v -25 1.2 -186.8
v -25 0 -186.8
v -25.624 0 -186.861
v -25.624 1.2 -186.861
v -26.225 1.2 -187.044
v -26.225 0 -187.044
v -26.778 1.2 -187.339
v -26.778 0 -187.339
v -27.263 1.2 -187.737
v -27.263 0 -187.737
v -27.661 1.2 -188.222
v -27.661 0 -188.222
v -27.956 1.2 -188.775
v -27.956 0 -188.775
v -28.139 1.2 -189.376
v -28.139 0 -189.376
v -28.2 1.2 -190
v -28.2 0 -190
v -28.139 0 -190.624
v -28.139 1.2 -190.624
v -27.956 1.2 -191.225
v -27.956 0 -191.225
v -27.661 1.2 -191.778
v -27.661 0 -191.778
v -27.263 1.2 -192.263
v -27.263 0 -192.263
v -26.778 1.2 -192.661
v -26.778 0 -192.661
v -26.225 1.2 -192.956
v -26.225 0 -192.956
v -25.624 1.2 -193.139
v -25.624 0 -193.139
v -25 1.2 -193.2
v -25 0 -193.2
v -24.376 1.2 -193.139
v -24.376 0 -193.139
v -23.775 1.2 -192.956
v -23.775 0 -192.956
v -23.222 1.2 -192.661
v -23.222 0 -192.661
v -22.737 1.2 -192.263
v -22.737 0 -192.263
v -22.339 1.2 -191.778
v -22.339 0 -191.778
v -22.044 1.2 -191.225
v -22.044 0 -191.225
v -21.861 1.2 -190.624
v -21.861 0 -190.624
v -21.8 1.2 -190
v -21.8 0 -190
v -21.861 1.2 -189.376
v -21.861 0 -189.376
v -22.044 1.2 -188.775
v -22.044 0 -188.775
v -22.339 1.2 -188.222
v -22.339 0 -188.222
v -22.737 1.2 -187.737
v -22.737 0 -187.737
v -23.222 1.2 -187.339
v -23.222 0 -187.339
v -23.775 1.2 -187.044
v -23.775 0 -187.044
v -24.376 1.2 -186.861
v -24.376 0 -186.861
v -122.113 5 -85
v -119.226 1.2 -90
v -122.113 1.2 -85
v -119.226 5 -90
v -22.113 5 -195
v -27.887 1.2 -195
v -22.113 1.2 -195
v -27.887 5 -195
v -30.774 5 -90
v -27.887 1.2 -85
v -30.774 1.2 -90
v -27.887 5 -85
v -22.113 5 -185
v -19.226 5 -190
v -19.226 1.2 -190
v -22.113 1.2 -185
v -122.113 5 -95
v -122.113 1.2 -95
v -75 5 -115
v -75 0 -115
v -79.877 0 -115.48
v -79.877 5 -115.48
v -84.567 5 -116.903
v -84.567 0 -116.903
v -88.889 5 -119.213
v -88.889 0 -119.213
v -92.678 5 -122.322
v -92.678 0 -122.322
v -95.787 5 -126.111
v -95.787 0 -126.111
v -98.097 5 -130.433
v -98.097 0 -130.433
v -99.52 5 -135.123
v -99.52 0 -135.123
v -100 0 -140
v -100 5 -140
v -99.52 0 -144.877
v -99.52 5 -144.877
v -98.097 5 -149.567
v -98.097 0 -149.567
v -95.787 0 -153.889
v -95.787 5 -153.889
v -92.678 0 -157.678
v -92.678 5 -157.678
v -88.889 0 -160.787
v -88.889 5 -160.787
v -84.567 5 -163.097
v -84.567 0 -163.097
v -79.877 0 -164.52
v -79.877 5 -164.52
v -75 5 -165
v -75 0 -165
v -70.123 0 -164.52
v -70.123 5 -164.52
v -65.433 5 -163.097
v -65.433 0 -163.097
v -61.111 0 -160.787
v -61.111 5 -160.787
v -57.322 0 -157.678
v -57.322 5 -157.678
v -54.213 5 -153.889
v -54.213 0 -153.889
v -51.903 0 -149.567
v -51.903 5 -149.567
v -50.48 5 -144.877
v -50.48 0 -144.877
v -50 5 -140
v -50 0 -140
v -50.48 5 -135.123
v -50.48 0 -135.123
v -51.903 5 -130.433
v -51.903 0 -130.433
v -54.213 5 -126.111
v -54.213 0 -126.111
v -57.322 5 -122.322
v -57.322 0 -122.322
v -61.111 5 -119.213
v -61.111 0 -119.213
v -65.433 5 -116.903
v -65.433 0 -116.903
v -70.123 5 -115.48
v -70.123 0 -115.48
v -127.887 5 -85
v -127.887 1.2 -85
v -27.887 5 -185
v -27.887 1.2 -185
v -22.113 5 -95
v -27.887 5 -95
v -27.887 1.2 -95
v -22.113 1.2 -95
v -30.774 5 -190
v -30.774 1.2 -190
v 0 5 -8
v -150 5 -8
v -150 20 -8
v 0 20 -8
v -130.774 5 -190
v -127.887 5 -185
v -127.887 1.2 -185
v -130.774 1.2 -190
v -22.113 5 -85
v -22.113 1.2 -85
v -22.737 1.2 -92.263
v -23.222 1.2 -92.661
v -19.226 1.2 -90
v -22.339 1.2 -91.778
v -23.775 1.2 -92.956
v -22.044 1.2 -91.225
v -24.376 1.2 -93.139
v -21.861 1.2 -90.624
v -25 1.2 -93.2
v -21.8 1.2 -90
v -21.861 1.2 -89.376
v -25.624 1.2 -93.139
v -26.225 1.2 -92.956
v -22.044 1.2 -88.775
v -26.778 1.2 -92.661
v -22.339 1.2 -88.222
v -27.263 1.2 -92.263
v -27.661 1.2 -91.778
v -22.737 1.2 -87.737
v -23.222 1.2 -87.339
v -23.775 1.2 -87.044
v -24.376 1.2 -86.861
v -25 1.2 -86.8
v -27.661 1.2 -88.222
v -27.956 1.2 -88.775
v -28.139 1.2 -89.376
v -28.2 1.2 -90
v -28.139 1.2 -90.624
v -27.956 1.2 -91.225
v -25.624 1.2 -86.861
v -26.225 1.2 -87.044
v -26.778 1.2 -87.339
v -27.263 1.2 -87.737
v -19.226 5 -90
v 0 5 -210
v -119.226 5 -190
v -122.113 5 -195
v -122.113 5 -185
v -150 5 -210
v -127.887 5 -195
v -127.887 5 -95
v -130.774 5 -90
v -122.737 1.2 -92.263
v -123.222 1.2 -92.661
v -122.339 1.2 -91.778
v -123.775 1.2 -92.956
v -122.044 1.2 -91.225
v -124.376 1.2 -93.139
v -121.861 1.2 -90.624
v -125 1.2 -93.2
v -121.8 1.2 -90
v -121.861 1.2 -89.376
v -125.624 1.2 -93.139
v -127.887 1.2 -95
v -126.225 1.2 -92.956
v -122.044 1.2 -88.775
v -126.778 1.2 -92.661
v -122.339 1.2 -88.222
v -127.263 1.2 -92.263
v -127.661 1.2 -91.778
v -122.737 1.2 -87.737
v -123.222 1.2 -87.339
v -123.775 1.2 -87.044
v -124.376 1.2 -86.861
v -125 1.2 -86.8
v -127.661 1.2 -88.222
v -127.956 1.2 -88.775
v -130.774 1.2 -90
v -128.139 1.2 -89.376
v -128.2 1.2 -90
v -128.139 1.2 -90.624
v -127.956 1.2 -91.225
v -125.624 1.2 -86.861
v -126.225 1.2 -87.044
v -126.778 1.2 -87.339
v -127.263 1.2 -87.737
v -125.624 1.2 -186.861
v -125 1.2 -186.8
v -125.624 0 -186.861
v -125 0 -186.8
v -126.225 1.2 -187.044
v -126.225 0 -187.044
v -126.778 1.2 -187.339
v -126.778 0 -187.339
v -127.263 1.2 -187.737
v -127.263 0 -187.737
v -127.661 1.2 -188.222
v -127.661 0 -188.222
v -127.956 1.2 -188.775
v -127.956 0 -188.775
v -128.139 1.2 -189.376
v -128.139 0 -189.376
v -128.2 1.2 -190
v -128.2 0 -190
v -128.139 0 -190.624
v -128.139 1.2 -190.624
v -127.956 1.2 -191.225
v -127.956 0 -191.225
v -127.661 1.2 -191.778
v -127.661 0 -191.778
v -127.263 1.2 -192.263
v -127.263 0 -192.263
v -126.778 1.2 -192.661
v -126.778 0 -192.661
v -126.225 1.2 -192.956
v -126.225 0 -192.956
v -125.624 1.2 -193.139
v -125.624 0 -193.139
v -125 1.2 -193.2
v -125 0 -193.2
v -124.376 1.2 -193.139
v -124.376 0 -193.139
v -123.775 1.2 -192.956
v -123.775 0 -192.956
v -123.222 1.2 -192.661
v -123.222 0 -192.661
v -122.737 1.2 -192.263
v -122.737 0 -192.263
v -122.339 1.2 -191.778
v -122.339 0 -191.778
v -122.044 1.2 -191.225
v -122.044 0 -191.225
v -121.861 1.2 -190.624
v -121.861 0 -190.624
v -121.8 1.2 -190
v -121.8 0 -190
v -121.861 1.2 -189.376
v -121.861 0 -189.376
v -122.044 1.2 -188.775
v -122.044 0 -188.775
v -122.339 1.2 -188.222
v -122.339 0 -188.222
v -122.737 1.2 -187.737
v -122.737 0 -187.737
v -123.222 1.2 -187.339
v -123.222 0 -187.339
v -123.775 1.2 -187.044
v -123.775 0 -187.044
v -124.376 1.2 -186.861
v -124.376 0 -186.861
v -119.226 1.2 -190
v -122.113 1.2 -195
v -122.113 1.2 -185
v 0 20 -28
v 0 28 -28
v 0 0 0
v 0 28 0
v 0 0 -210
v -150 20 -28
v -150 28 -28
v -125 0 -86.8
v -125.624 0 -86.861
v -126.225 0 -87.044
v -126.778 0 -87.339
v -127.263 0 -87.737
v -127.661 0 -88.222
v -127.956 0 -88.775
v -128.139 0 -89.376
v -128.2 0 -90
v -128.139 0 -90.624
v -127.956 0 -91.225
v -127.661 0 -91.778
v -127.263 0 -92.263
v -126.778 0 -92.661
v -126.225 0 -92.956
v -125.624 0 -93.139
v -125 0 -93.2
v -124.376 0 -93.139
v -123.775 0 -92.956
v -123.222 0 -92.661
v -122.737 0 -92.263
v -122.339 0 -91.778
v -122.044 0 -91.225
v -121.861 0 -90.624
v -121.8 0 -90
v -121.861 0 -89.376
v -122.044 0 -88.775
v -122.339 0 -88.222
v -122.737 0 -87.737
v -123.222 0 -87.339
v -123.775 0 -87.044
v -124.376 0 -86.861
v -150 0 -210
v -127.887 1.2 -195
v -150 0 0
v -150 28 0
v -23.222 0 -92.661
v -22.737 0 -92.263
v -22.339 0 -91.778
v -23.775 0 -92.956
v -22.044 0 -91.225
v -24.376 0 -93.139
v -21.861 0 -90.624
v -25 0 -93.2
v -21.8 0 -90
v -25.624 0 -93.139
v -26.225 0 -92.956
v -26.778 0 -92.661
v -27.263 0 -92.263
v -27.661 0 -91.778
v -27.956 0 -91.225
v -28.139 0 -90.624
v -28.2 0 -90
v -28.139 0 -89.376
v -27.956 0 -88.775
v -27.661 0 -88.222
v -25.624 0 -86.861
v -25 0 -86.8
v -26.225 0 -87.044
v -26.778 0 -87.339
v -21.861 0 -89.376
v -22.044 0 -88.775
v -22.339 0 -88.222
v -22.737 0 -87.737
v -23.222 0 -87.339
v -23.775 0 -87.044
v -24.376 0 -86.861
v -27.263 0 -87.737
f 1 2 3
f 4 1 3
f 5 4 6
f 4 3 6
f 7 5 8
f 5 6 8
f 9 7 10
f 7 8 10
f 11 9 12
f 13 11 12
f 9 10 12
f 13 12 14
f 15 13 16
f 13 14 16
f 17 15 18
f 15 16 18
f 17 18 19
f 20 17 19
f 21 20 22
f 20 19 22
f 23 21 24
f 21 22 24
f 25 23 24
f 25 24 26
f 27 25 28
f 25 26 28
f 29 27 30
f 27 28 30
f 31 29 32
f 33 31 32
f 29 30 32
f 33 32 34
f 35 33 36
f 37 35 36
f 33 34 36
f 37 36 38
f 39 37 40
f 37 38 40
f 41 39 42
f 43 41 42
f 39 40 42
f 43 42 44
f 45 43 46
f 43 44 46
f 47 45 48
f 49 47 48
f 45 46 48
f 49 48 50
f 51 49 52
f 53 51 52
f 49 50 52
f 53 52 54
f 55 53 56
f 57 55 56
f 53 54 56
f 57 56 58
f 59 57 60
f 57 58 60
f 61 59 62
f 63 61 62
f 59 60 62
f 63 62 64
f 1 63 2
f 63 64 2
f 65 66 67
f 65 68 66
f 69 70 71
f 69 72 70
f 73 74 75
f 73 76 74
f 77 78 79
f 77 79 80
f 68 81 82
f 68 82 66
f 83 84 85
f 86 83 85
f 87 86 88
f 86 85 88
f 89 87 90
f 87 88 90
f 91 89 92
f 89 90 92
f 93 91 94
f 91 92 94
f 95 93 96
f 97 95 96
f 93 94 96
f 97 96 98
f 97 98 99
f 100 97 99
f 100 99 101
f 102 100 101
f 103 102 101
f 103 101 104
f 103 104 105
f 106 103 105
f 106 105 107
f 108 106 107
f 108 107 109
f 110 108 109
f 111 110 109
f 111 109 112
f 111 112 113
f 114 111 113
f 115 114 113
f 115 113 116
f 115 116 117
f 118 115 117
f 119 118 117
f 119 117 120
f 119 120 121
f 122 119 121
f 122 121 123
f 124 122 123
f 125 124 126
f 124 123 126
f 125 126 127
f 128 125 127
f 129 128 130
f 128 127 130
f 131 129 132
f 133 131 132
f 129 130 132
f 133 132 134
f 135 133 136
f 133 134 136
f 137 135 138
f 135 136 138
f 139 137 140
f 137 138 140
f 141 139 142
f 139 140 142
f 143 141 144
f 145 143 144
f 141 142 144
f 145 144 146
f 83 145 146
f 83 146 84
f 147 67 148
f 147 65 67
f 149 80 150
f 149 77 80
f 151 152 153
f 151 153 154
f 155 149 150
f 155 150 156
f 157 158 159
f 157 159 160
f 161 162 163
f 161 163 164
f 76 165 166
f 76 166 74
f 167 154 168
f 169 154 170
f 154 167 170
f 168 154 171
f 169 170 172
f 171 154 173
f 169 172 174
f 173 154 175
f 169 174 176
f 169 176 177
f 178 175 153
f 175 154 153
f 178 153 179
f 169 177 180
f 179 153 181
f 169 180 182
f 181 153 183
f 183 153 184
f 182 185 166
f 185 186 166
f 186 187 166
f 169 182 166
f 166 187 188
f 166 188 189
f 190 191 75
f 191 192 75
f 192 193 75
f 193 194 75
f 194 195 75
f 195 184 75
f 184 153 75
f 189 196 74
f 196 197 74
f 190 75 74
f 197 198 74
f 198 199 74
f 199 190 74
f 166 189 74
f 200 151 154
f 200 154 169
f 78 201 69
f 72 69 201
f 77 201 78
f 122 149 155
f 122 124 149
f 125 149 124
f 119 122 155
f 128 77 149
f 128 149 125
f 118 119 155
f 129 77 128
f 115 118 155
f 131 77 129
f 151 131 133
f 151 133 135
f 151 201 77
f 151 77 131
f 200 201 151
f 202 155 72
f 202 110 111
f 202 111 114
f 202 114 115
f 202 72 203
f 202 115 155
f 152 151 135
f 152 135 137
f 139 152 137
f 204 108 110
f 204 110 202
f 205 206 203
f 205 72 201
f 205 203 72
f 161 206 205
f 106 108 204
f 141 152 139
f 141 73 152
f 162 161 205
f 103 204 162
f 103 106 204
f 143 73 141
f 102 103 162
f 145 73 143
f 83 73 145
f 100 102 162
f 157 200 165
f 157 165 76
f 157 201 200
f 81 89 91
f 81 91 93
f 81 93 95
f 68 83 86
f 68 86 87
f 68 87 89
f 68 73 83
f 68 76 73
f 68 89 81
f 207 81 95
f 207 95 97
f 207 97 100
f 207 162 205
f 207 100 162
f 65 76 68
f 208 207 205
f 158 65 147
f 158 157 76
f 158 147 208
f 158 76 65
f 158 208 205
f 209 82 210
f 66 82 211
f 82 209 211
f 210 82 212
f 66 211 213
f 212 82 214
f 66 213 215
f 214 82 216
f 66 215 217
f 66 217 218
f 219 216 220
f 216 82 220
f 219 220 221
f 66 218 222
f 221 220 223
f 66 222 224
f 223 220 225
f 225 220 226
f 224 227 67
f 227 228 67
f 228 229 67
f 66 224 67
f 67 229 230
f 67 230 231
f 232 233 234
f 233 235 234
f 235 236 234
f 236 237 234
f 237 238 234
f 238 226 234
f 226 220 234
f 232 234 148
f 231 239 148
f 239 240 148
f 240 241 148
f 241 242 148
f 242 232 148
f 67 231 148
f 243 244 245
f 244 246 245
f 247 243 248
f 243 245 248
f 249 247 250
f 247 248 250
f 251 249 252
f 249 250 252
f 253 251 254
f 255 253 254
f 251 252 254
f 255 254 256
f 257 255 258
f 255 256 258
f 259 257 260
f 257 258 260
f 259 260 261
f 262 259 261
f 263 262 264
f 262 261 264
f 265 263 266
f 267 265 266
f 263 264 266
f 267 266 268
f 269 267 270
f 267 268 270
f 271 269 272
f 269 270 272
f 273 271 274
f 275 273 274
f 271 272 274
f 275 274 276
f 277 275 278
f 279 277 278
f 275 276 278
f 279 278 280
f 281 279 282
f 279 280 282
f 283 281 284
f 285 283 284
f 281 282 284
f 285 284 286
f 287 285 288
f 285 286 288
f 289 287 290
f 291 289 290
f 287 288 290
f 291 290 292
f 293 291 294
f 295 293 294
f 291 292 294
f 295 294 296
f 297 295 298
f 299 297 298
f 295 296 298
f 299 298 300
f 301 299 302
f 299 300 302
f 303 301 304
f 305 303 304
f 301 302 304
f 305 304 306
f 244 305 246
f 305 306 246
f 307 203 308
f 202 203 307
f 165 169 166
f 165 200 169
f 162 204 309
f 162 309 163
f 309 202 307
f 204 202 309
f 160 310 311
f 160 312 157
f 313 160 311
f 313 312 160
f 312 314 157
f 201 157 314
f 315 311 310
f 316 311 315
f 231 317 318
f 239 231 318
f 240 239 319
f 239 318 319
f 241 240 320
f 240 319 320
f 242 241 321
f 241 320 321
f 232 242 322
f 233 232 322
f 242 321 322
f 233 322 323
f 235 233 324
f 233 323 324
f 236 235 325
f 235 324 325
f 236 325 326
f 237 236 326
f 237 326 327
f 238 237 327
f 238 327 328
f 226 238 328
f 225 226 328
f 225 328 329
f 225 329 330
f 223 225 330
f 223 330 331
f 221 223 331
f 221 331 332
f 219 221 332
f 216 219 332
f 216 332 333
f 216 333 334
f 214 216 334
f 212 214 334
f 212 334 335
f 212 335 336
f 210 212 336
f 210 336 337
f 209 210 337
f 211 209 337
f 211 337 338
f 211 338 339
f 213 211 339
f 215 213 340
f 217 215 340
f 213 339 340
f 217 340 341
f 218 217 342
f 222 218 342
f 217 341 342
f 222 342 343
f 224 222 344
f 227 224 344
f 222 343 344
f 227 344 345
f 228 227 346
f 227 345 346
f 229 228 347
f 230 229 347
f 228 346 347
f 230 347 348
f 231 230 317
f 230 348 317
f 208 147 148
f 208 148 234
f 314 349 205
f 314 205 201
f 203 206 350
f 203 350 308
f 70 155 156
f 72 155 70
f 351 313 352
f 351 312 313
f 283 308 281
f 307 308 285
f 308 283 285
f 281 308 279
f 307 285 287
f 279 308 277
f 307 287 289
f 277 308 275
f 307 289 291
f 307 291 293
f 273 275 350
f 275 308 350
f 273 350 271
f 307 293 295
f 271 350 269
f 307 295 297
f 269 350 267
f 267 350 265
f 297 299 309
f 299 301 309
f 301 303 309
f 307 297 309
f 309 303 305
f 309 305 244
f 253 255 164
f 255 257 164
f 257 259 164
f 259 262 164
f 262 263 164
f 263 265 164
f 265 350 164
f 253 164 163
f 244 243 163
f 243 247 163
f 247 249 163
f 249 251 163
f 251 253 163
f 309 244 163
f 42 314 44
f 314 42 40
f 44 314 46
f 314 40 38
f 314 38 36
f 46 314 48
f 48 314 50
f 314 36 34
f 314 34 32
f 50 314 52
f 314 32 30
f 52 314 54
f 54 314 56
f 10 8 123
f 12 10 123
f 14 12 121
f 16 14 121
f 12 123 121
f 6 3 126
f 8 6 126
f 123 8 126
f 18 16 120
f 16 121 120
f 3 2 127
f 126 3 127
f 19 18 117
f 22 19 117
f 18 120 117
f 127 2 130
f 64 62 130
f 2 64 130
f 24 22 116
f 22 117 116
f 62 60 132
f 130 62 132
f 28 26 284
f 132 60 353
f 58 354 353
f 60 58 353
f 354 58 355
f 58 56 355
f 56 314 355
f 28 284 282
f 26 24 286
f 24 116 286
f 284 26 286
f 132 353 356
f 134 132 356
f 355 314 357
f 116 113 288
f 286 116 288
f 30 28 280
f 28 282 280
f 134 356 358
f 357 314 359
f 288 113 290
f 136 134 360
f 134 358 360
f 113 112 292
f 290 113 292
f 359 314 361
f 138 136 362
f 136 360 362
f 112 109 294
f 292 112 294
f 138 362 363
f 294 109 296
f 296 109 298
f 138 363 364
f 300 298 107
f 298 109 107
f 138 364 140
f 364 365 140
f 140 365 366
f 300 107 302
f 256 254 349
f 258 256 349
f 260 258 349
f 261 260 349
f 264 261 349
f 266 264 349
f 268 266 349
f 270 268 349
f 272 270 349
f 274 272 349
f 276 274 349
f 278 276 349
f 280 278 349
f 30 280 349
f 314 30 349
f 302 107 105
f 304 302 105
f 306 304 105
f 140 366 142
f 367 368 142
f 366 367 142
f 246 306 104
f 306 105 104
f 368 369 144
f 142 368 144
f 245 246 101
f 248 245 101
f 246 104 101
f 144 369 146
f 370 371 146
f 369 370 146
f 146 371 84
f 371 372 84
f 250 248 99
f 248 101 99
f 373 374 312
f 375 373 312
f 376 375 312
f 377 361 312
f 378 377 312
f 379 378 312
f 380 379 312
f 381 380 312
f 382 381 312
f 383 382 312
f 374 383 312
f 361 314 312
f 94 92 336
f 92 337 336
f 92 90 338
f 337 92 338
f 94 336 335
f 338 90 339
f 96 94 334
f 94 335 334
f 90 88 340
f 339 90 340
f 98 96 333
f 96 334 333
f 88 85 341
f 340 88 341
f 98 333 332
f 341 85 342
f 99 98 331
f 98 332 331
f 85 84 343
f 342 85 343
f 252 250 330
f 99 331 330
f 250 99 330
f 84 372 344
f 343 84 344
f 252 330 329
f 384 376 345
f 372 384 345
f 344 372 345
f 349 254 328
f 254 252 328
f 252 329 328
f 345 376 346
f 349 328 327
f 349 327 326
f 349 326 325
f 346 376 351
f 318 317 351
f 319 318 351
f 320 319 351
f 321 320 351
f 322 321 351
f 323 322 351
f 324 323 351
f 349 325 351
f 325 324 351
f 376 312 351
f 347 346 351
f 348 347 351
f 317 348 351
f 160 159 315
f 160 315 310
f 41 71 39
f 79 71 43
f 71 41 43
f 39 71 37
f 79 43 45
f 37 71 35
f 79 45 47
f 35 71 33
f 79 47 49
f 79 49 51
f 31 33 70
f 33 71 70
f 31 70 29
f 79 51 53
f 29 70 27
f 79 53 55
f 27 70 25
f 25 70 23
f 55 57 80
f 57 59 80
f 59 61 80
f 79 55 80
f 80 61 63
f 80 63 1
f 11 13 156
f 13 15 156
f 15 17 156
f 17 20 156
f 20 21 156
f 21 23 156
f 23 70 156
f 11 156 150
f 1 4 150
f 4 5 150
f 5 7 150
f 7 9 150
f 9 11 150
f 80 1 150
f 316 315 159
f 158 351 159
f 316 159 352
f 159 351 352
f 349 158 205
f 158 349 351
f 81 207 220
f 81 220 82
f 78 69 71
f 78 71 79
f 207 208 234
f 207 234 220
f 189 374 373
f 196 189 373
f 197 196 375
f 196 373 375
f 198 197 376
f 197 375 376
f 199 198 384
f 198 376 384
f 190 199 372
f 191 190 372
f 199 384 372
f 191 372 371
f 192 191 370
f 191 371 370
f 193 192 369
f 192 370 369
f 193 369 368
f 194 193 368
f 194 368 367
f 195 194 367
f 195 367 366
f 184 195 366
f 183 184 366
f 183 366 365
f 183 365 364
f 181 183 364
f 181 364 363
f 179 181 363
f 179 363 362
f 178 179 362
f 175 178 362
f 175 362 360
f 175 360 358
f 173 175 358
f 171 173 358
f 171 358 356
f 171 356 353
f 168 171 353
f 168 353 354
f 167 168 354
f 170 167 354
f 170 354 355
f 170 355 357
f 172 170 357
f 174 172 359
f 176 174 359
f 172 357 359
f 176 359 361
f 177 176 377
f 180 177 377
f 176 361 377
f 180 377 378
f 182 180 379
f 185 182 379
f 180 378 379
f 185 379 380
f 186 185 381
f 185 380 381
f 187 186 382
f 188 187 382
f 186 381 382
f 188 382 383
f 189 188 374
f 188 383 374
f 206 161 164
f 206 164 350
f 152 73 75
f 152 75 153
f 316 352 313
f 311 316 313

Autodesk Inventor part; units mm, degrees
ref_plane "YZ Plane" through (0, 0, 0) normal (1, 0, 0) x (0, 1, 0)
ref_plane "XZ Plane" through (0, 0, 0) normal (0, 1, 0) x (-1, 0, 0)
ref_plane "XY Plane" through (0, 0, 0) normal (0, 0, 1) x (1, 0, 0)
sketch "Sketch1" plane through (0, 0, 0) normal (0, 1, 0) x (-1, 0, 0)
  line L0 (0, 0) -> (150, 0)
  line L1 (150, 0) -> (150, -210)
  line L2 (150, -210) -> (0, -210)
  line L3 (0, -210) -> (0, 0)
  dimension "d11" = 150
  dimension "d12" = 210
extrude "Extrusion1" add sketch "Sketch1" along normal blind 5
sketch "Sketch2" plane through (0, 5, 0) normal (0, 1, 0) x (1, 0, 0)
  line L0 (-150, 0) -> (0, 0) projected
  line L1 (-150, 210) -> (-150, 0) projected
  line L2 (0, 0) -> (-150, 0)
  line L3 (-150, 0) -> (-150, 8)
  line L4 (-150, 8) -> (0, 8)
  line L5 (0, 8) -> (0, 0)
  dimension "d13" = 8
extrude "Extrusion2" add sketch "Sketch2" along normal blind 23
sketch "Sketch3" plane through (0, 5, -8) normal (0, 0, -1) x (-1, 0, 0)
  line L0 (150, 23) -> (0, 23) projected
  line L1 (150, -5) -> (150, 23) projected
  line L2 (0, 23) -> (150, 23)
  line L3 (150, 23) -> (150, 15)
  line L4 (150, 15) -> (0, 15)
  line L5 (0, 15) -> (0, 23)
  point P0 (0, -5)
  dimension "d14" = 8
extrude "Extrusion3" add sketch "Sketch3" along normal blind 20
sketch "Sketch6" plane through (0, 5, 0) normal (0, 1, 0) x (1, 0, 0)
  line L0 (-150, 8) -> (0, 8) projected
  line L1 (-75, 8) -> (-75, 210)
  line L2 (0, 210) -> (-150, 210) projected
  line L3 (-150, 210) -> (-150, 8) projected
  line L4 (-150, 140) -> (0, 140)
  line L5 (0, 8) -> (0, 210) projected
  circle A0 centre (-125, 90) radius 3.2
  circle A1 centre (-125, 190) radius 3.2
  circle A2 centre (-25, 190) radius 3.2
  circle A3 centre (-25, 90) radius 3.2
  line L6 (-150, 0) -> (0, 0) projected
  dimension "d44" = 50
  dimension "d45" = 6.4
  dimension "d46" = 50
  dimension "d64" = 140
hole "Hole2" at (-25, 5, -190) at (-25, 5, -90) at (-125, 5, -90) at (-125, 5, -190) direction (0, -1, 0) diameter 6.4 end through all counterbore diameter 9 counterbore depth 3.8
sketch "Sketch5" plane through (0, 5, 0) normal (0, 1, 0) x (1, 0, 0)
  line L0 (-27.8868, 195) -> (-22.1132, 195)
  line L1 (-22.1132, 195) -> (-19.2265, 190)
  line L2 (-19.2265, 190) -> (-22.1132, 185)
  line L3 (-22.1132, 185) -> (-27.8868, 185)
  line L4 (-27.8868, 185) -> (-30.7735, 190)
  line L5 (-30.7735, 190) -> (-27.8868, 195)
  line L6 (-27.8868, 85) -> (-30.7735, 90)
  line L7 (-30.7735, 90) -> (-27.8868, 95)
  line L8 (-27.8868, 95) -> (-22.1132, 95)
  line L9 (-22.1132, 95) -> (-19.2265, 90)
  line L10 (-19.2265, 90) -> (-22.1132, 85)
  line L11 (-22.1132, 85) -> (-27.8868, 85)
  line L12 (-127.8868, 185) -> (-130.7735, 190)
  line L13 (-130.7735, 190) -> (-127.8868, 195)
  line L14 (-127.8868, 195) -> (-122.1132, 195)
  line L15 (-122.1132, 195) -> (-119.2265, 190)
  line L16 (-119.2265, 190) -> (-122.1132, 185)
  line L17 (-122.1132, 185) -> (-127.8868, 185)
  line L18 (-150, 210) -> (0, 210) projected
  line L19 (-75, 210) -> (-75, 30.6019)
  line L20 (-127.8868, 85) -> (-130.7735, 90)
  line L21 (-130.7735, 90) -> (-127.8868, 95)
  line L22 (-127.8868, 95) -> (-122.1132, 95)
  line L23 (-122.1132, 95) -> (-119.2265, 90)
  line L24 (-119.2265, 90) -> (-122.1132, 85)
  line L25 (-122.1132, 85) -> (-127.8868, 85)
  line L26 (-150, 210) -> (-150, 8) projected
  line L27 (-146.8054, 140) -> (0, 140)
  line L28 (0, 210) -> (0, 0) projected
  line L29 (-150, 0) -> (0, 0) projected
  point P0 (-25, 190)
  point P1 (-25, 90)
  point P2 (-125, 190)
  point P3 (-125, 90)
  dimension "d34" = 10
  dimension "d54" = 10
  dimension "d55" = 10
  dimension "d56" = 10
  dimension "d57" = 100
  dimension "d58" = 100
  dimension "d65" = 140
extrude "Extrusion6" cut sketch "Sketch5" against normal blind 3.8 contours L0 L1 L2 L3 L4 L5 | L6 L7 L8 L9 L10 L11 | L12 L13 L14 L15 L16 L17 | L20 L21 L22 L23 L24 L25
sketch "Sketch7" plane through (0, 5, 0) normal (0, 1, 0) x (1, 0, 0)
  circle A0 centre (-75, 140) radius 27.9443
  line L0 (-150, 140) -> (0, 140)
  line L1 (-150, 210) -> (0, 210) projected
  line L2 (-75, 210) -> (-75, 0)
  line L3 (0, 210) -> (0, 0) projected
  line L4 (-150, 210) -> (0, 210)
  line L5 (0, 210) -> (0, 0)
  line L6 (0, 0) -> (-150, 0)
  line L7 (-150, 0) -> (-150, 210)
  line L8 (0, 8) -> (0, 210) projected
  line L9 (-150, 210) -> (-150, 8) projected
  line L10 (0, 210) -> (-150, 210) projected
  line L11 (-150, 0) -> (0, 0) projected
  dimension "d66" = 140
hole "Hole3" at (-75, 5, -140) direction (0, -1, 0) diameter 50 end through all
properties part number "Stand"
